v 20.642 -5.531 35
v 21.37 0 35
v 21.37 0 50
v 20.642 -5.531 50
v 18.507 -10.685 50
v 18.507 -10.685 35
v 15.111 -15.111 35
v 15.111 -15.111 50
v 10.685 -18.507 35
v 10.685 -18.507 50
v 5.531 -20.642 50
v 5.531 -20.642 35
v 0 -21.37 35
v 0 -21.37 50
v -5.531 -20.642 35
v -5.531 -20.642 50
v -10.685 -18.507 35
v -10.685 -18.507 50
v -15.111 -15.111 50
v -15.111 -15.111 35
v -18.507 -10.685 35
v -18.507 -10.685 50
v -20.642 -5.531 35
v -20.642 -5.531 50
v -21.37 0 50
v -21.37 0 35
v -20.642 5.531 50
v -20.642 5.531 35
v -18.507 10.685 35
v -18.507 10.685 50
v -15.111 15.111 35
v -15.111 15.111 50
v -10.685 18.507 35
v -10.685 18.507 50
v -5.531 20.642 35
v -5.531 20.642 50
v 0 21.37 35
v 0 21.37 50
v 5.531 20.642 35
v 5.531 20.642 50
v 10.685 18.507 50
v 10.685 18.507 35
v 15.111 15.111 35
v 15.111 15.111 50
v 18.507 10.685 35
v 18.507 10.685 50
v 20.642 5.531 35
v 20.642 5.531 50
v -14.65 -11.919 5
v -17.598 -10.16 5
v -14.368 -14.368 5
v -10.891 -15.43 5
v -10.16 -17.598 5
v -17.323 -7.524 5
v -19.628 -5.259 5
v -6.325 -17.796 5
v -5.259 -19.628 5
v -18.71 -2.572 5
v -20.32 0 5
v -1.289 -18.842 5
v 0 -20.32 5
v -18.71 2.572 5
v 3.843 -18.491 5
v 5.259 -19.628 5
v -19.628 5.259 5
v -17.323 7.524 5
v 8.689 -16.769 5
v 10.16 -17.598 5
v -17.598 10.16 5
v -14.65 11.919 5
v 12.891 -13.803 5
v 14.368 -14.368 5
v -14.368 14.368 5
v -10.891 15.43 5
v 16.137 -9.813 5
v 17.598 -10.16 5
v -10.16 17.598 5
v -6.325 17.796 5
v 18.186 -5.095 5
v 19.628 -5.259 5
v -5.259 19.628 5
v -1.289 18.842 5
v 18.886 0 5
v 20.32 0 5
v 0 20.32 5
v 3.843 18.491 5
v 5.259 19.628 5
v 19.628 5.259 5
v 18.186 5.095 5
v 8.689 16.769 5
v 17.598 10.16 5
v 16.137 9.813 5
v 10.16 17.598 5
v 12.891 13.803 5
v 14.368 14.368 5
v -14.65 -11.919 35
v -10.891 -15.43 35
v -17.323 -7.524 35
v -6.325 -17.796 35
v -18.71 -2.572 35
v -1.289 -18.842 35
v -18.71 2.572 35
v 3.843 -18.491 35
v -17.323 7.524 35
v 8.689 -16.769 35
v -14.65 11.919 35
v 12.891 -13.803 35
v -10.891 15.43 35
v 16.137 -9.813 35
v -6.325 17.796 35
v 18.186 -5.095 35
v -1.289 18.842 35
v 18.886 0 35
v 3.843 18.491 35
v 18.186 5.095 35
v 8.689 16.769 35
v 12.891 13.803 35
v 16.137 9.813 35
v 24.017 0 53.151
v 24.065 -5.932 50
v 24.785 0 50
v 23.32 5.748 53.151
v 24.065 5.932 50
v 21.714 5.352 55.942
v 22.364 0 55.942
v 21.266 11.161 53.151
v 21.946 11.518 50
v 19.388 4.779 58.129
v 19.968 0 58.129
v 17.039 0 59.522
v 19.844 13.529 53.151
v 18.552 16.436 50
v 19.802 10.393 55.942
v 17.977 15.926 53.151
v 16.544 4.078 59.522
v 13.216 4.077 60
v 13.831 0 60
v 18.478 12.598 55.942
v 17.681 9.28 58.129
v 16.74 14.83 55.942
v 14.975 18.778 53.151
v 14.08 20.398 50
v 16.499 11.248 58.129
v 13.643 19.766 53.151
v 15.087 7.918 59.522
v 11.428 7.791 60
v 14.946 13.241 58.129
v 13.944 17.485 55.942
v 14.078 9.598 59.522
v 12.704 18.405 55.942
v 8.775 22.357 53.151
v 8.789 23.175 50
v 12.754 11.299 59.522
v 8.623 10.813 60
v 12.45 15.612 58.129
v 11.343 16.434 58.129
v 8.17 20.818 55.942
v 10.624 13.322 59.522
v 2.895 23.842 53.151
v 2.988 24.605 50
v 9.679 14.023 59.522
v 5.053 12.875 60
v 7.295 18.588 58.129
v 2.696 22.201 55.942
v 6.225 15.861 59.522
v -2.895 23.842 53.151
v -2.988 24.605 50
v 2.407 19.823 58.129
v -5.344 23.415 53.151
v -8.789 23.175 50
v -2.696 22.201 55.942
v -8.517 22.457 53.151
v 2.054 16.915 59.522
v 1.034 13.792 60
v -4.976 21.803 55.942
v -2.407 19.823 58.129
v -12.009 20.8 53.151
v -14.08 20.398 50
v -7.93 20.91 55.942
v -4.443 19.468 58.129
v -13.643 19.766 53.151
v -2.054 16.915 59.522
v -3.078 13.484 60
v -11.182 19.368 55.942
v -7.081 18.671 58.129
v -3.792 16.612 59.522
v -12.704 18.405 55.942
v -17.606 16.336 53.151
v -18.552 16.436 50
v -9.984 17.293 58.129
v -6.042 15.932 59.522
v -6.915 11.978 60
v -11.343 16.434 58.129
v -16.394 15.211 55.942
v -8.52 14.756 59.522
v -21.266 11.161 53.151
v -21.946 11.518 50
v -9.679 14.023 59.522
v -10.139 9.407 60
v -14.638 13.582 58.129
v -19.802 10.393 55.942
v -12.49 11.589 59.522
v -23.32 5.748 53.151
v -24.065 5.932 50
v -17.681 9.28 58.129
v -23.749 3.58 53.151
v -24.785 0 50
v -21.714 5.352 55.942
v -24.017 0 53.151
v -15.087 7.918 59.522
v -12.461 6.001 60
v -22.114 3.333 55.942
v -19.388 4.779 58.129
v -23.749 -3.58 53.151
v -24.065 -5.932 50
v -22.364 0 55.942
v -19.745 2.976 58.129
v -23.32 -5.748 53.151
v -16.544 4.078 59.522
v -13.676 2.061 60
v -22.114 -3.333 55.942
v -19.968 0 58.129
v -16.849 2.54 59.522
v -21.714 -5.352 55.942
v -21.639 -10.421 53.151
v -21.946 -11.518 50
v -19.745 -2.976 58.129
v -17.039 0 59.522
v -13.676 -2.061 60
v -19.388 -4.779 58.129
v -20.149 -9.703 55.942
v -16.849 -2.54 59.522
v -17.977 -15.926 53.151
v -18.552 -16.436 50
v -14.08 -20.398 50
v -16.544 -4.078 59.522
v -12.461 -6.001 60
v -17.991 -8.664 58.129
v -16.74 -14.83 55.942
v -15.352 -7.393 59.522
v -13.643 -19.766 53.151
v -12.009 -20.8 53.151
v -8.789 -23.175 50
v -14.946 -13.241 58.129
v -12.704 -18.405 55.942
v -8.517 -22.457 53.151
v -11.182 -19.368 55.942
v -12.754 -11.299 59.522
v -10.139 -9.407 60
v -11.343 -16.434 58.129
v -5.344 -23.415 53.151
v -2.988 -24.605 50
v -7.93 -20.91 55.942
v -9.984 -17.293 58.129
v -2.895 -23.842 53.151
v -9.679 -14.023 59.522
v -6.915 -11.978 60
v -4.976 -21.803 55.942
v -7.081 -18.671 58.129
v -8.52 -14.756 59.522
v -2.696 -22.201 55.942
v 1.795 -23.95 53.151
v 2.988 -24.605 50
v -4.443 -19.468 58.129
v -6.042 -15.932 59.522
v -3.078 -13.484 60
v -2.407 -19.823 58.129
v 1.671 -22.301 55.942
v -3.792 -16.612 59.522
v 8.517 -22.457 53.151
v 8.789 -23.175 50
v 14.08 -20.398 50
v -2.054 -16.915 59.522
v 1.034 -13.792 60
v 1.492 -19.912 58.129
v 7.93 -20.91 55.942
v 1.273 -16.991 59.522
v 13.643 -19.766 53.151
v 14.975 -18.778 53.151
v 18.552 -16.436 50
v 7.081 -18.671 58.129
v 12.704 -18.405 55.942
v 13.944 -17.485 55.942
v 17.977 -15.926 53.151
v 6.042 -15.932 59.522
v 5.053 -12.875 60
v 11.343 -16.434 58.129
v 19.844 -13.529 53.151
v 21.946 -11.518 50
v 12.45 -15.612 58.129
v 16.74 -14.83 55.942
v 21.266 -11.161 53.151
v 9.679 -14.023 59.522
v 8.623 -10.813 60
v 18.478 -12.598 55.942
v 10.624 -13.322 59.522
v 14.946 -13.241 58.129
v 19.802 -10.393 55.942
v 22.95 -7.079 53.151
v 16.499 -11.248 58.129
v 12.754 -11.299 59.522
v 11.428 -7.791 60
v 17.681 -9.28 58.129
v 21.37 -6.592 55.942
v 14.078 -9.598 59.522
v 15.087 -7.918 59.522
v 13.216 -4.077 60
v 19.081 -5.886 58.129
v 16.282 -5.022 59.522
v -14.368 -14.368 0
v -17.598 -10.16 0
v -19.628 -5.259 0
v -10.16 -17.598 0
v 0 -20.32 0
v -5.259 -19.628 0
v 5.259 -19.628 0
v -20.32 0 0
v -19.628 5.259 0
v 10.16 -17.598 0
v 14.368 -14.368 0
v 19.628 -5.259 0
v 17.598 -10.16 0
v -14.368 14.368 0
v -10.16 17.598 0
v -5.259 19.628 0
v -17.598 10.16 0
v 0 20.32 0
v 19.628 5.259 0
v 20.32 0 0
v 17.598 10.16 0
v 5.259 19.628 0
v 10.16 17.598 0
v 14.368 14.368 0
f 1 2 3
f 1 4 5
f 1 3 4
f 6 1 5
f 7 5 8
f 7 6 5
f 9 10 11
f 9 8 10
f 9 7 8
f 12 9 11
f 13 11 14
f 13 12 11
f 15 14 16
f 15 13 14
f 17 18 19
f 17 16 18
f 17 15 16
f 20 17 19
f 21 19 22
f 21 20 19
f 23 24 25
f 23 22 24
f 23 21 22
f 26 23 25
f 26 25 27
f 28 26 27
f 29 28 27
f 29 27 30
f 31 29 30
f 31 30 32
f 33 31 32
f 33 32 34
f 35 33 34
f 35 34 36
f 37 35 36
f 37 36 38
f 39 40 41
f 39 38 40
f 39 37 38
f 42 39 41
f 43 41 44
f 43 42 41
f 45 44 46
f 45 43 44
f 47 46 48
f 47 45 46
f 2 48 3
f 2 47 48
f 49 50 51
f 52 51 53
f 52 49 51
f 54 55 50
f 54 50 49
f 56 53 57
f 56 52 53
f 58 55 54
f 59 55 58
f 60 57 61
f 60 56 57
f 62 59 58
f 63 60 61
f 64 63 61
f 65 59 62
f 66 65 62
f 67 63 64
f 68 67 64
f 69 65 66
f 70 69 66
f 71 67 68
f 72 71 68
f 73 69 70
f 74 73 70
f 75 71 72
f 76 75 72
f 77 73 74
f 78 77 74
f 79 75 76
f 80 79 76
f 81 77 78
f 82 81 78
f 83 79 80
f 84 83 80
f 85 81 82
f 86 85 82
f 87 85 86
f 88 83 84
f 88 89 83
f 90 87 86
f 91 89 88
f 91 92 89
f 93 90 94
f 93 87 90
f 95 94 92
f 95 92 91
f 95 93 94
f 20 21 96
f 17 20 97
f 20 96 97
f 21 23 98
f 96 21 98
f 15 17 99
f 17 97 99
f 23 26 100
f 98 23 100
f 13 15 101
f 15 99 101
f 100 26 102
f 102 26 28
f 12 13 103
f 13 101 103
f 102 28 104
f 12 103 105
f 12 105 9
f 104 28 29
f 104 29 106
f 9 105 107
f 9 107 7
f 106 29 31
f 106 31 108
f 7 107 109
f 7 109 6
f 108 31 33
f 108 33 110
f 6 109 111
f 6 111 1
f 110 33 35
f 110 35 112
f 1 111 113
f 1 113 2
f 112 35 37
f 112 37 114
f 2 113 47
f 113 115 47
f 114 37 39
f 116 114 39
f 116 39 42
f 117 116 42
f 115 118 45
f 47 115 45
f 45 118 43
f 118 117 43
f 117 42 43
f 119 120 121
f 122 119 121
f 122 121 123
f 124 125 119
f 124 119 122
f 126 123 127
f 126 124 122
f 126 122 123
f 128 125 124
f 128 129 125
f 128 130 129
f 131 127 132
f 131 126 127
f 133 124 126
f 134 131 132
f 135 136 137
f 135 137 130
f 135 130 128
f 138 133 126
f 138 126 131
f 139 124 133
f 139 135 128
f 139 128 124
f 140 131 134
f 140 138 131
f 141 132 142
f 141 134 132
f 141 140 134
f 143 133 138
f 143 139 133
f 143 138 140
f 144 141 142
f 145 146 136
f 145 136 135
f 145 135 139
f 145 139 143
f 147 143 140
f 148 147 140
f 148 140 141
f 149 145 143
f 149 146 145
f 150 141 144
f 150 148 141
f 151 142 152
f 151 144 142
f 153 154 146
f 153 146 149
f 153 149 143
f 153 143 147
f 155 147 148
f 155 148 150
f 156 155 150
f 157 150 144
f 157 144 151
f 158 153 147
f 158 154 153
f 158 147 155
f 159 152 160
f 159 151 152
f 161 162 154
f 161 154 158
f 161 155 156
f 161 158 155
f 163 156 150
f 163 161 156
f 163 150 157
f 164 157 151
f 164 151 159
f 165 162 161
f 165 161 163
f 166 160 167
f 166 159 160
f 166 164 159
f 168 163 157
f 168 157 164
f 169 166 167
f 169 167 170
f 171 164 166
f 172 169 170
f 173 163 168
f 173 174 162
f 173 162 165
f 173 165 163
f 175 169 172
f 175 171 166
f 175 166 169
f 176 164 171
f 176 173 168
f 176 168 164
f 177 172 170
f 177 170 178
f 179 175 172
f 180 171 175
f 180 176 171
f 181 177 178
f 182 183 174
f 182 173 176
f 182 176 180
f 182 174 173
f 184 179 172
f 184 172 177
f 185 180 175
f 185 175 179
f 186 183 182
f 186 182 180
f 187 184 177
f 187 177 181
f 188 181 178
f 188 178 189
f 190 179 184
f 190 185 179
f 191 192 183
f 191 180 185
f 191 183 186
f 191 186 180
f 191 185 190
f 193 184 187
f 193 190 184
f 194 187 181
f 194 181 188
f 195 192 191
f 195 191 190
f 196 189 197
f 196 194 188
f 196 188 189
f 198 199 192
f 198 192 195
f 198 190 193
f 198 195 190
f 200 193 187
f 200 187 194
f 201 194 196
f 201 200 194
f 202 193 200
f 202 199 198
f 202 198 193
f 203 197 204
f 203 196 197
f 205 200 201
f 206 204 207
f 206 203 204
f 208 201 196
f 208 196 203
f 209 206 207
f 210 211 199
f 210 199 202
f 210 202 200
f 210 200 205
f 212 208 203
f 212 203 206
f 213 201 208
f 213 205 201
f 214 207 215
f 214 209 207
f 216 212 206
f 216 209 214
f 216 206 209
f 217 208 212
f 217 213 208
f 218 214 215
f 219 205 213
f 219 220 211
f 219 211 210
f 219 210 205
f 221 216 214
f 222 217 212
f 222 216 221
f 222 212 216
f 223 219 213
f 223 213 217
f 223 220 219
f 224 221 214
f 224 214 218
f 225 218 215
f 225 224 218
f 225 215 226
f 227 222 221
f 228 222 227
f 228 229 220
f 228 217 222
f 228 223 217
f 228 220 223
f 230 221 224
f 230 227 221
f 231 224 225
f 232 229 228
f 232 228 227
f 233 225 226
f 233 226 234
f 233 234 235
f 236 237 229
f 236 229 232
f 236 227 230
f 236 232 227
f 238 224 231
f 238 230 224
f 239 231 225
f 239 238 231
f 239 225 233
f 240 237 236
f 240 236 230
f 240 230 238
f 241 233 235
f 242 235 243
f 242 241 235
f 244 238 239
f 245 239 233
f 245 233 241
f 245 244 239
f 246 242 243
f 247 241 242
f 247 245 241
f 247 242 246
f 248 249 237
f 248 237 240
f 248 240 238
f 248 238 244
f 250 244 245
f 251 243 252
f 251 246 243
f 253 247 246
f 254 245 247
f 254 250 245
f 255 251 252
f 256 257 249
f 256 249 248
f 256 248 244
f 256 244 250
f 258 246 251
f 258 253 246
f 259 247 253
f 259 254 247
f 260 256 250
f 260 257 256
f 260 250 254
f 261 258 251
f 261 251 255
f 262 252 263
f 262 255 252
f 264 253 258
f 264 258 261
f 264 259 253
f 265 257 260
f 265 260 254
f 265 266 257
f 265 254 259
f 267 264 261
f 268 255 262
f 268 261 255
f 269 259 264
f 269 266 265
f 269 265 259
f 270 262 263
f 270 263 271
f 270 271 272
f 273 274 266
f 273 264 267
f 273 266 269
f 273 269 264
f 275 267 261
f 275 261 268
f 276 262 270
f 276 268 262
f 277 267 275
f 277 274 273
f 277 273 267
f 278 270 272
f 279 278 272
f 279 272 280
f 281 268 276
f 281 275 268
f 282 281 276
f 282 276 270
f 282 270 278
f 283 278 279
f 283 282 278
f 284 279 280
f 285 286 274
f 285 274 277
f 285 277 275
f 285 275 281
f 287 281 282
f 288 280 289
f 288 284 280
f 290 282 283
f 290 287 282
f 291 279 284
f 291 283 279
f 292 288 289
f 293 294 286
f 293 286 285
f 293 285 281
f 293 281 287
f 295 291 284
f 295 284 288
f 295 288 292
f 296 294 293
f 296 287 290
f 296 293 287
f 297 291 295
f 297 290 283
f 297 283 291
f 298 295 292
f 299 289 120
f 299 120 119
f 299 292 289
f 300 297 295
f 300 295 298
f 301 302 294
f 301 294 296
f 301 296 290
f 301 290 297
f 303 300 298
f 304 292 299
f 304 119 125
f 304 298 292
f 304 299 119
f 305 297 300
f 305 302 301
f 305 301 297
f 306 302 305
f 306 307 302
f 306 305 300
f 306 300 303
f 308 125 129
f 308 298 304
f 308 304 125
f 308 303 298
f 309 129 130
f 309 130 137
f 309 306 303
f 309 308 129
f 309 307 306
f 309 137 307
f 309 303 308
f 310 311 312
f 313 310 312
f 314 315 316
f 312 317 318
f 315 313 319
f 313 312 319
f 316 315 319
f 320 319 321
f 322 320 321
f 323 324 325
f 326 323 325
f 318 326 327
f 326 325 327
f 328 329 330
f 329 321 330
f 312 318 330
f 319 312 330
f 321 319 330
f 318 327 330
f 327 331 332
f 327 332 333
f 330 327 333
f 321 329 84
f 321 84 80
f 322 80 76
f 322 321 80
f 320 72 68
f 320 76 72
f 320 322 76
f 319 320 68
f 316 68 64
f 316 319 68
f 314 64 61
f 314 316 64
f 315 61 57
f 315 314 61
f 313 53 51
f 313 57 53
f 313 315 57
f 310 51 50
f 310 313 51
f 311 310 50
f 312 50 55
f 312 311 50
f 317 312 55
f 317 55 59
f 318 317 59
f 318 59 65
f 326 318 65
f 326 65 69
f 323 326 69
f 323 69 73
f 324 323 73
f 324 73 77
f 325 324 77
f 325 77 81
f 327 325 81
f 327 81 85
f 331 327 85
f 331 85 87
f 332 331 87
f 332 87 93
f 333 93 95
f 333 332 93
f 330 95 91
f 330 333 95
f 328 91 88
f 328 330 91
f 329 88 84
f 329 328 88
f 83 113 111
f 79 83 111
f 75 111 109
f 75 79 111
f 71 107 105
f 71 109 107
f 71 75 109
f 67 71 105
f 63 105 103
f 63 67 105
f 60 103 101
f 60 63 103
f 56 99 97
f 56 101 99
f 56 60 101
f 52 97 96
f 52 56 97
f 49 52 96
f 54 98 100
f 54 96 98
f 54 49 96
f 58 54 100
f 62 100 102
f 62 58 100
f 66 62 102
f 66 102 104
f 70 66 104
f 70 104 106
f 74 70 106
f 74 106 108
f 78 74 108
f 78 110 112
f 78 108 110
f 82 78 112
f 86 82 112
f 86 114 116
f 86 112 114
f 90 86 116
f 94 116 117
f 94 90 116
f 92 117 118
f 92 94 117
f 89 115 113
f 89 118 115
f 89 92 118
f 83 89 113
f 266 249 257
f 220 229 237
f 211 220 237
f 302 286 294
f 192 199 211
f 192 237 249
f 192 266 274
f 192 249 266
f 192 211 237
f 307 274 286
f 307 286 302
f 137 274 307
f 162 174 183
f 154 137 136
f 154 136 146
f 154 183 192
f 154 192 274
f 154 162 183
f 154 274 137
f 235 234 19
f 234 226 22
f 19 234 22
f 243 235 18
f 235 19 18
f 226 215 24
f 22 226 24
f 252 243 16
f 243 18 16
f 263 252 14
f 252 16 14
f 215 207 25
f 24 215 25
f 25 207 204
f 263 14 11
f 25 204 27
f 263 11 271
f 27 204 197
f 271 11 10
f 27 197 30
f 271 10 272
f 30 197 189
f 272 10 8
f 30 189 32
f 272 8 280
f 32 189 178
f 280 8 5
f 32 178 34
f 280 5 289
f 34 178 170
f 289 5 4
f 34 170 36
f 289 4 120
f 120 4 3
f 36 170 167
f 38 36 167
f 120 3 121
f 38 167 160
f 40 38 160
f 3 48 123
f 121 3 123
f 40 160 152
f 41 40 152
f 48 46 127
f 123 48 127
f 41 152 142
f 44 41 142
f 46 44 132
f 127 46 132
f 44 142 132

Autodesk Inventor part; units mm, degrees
ref_plane "YZ Plane" through (0, 0, 0) normal (1, 0, 0) x (0, 1, 0)
ref_plane "XZ Plane" through (0, 0, 0) normal (0, 1, 0) x (-1, 0, 0)
ref_plane "XY Plane" through (0, 0, 0) normal (0, 0, 1) x (1, 0, 0)
sketch "Sketch1" plane through (0, 0, 0) normal (0, 0, 1) x (1, 0, 0)
  circle A0 centre (0, 0) radius 20.32
  dimension "d0" = 40.64
extrude "Extrusion1" add sketch "Sketch1" along normal blind 5
sketch "Sketch2" plane through (0, 0, 5) normal (0, 0, 1) x (1, 0, 0)
  circle A0 centre (0, 0) radius 18.8864
extrude "Extrusion4" add sketch "Sketch2" along normal blind 30
sketch "Sketch3" plane through (0, 0, 35) normal (0, 0, 1) x (1, 0, 0)
  circle A0 centre (0, 0) radius 21.3705
extrude "Extrusion5" add sketch "Sketch3" along normal blind 15
sketch "Sketch4" plane through (0, 0, 50) normal (0, 0, 1) x (1, 0, 0)
  circle A0 centre (0, 0) radius 24.7853
extrude "Extrusion6" add sketch "Sketch4" along normal blind 10
fillet "Fillet1" radius 11 1 edges at (-24.7853, 0, 60)
equation "\"BendRadius\" = Thickness"
equation "\"BendReliefWidth\" = Thickness"
equation "\"BendReliefDepth\" = 0.5 * Thickness"
equation "\"CornerReliefSize\" = 4 * Thickness"
equation "\"MinimumRemnant\" = 2 * Thickness"
equation "\"TransitionRadius\" = BendRadius"
equation "\"JacobiRadiusSize\" = BendRadius"
equation "\"GapSize\" = Thickness"
equation "\"Thickness\" = 3.048"
properties part number "hitan_stop"
